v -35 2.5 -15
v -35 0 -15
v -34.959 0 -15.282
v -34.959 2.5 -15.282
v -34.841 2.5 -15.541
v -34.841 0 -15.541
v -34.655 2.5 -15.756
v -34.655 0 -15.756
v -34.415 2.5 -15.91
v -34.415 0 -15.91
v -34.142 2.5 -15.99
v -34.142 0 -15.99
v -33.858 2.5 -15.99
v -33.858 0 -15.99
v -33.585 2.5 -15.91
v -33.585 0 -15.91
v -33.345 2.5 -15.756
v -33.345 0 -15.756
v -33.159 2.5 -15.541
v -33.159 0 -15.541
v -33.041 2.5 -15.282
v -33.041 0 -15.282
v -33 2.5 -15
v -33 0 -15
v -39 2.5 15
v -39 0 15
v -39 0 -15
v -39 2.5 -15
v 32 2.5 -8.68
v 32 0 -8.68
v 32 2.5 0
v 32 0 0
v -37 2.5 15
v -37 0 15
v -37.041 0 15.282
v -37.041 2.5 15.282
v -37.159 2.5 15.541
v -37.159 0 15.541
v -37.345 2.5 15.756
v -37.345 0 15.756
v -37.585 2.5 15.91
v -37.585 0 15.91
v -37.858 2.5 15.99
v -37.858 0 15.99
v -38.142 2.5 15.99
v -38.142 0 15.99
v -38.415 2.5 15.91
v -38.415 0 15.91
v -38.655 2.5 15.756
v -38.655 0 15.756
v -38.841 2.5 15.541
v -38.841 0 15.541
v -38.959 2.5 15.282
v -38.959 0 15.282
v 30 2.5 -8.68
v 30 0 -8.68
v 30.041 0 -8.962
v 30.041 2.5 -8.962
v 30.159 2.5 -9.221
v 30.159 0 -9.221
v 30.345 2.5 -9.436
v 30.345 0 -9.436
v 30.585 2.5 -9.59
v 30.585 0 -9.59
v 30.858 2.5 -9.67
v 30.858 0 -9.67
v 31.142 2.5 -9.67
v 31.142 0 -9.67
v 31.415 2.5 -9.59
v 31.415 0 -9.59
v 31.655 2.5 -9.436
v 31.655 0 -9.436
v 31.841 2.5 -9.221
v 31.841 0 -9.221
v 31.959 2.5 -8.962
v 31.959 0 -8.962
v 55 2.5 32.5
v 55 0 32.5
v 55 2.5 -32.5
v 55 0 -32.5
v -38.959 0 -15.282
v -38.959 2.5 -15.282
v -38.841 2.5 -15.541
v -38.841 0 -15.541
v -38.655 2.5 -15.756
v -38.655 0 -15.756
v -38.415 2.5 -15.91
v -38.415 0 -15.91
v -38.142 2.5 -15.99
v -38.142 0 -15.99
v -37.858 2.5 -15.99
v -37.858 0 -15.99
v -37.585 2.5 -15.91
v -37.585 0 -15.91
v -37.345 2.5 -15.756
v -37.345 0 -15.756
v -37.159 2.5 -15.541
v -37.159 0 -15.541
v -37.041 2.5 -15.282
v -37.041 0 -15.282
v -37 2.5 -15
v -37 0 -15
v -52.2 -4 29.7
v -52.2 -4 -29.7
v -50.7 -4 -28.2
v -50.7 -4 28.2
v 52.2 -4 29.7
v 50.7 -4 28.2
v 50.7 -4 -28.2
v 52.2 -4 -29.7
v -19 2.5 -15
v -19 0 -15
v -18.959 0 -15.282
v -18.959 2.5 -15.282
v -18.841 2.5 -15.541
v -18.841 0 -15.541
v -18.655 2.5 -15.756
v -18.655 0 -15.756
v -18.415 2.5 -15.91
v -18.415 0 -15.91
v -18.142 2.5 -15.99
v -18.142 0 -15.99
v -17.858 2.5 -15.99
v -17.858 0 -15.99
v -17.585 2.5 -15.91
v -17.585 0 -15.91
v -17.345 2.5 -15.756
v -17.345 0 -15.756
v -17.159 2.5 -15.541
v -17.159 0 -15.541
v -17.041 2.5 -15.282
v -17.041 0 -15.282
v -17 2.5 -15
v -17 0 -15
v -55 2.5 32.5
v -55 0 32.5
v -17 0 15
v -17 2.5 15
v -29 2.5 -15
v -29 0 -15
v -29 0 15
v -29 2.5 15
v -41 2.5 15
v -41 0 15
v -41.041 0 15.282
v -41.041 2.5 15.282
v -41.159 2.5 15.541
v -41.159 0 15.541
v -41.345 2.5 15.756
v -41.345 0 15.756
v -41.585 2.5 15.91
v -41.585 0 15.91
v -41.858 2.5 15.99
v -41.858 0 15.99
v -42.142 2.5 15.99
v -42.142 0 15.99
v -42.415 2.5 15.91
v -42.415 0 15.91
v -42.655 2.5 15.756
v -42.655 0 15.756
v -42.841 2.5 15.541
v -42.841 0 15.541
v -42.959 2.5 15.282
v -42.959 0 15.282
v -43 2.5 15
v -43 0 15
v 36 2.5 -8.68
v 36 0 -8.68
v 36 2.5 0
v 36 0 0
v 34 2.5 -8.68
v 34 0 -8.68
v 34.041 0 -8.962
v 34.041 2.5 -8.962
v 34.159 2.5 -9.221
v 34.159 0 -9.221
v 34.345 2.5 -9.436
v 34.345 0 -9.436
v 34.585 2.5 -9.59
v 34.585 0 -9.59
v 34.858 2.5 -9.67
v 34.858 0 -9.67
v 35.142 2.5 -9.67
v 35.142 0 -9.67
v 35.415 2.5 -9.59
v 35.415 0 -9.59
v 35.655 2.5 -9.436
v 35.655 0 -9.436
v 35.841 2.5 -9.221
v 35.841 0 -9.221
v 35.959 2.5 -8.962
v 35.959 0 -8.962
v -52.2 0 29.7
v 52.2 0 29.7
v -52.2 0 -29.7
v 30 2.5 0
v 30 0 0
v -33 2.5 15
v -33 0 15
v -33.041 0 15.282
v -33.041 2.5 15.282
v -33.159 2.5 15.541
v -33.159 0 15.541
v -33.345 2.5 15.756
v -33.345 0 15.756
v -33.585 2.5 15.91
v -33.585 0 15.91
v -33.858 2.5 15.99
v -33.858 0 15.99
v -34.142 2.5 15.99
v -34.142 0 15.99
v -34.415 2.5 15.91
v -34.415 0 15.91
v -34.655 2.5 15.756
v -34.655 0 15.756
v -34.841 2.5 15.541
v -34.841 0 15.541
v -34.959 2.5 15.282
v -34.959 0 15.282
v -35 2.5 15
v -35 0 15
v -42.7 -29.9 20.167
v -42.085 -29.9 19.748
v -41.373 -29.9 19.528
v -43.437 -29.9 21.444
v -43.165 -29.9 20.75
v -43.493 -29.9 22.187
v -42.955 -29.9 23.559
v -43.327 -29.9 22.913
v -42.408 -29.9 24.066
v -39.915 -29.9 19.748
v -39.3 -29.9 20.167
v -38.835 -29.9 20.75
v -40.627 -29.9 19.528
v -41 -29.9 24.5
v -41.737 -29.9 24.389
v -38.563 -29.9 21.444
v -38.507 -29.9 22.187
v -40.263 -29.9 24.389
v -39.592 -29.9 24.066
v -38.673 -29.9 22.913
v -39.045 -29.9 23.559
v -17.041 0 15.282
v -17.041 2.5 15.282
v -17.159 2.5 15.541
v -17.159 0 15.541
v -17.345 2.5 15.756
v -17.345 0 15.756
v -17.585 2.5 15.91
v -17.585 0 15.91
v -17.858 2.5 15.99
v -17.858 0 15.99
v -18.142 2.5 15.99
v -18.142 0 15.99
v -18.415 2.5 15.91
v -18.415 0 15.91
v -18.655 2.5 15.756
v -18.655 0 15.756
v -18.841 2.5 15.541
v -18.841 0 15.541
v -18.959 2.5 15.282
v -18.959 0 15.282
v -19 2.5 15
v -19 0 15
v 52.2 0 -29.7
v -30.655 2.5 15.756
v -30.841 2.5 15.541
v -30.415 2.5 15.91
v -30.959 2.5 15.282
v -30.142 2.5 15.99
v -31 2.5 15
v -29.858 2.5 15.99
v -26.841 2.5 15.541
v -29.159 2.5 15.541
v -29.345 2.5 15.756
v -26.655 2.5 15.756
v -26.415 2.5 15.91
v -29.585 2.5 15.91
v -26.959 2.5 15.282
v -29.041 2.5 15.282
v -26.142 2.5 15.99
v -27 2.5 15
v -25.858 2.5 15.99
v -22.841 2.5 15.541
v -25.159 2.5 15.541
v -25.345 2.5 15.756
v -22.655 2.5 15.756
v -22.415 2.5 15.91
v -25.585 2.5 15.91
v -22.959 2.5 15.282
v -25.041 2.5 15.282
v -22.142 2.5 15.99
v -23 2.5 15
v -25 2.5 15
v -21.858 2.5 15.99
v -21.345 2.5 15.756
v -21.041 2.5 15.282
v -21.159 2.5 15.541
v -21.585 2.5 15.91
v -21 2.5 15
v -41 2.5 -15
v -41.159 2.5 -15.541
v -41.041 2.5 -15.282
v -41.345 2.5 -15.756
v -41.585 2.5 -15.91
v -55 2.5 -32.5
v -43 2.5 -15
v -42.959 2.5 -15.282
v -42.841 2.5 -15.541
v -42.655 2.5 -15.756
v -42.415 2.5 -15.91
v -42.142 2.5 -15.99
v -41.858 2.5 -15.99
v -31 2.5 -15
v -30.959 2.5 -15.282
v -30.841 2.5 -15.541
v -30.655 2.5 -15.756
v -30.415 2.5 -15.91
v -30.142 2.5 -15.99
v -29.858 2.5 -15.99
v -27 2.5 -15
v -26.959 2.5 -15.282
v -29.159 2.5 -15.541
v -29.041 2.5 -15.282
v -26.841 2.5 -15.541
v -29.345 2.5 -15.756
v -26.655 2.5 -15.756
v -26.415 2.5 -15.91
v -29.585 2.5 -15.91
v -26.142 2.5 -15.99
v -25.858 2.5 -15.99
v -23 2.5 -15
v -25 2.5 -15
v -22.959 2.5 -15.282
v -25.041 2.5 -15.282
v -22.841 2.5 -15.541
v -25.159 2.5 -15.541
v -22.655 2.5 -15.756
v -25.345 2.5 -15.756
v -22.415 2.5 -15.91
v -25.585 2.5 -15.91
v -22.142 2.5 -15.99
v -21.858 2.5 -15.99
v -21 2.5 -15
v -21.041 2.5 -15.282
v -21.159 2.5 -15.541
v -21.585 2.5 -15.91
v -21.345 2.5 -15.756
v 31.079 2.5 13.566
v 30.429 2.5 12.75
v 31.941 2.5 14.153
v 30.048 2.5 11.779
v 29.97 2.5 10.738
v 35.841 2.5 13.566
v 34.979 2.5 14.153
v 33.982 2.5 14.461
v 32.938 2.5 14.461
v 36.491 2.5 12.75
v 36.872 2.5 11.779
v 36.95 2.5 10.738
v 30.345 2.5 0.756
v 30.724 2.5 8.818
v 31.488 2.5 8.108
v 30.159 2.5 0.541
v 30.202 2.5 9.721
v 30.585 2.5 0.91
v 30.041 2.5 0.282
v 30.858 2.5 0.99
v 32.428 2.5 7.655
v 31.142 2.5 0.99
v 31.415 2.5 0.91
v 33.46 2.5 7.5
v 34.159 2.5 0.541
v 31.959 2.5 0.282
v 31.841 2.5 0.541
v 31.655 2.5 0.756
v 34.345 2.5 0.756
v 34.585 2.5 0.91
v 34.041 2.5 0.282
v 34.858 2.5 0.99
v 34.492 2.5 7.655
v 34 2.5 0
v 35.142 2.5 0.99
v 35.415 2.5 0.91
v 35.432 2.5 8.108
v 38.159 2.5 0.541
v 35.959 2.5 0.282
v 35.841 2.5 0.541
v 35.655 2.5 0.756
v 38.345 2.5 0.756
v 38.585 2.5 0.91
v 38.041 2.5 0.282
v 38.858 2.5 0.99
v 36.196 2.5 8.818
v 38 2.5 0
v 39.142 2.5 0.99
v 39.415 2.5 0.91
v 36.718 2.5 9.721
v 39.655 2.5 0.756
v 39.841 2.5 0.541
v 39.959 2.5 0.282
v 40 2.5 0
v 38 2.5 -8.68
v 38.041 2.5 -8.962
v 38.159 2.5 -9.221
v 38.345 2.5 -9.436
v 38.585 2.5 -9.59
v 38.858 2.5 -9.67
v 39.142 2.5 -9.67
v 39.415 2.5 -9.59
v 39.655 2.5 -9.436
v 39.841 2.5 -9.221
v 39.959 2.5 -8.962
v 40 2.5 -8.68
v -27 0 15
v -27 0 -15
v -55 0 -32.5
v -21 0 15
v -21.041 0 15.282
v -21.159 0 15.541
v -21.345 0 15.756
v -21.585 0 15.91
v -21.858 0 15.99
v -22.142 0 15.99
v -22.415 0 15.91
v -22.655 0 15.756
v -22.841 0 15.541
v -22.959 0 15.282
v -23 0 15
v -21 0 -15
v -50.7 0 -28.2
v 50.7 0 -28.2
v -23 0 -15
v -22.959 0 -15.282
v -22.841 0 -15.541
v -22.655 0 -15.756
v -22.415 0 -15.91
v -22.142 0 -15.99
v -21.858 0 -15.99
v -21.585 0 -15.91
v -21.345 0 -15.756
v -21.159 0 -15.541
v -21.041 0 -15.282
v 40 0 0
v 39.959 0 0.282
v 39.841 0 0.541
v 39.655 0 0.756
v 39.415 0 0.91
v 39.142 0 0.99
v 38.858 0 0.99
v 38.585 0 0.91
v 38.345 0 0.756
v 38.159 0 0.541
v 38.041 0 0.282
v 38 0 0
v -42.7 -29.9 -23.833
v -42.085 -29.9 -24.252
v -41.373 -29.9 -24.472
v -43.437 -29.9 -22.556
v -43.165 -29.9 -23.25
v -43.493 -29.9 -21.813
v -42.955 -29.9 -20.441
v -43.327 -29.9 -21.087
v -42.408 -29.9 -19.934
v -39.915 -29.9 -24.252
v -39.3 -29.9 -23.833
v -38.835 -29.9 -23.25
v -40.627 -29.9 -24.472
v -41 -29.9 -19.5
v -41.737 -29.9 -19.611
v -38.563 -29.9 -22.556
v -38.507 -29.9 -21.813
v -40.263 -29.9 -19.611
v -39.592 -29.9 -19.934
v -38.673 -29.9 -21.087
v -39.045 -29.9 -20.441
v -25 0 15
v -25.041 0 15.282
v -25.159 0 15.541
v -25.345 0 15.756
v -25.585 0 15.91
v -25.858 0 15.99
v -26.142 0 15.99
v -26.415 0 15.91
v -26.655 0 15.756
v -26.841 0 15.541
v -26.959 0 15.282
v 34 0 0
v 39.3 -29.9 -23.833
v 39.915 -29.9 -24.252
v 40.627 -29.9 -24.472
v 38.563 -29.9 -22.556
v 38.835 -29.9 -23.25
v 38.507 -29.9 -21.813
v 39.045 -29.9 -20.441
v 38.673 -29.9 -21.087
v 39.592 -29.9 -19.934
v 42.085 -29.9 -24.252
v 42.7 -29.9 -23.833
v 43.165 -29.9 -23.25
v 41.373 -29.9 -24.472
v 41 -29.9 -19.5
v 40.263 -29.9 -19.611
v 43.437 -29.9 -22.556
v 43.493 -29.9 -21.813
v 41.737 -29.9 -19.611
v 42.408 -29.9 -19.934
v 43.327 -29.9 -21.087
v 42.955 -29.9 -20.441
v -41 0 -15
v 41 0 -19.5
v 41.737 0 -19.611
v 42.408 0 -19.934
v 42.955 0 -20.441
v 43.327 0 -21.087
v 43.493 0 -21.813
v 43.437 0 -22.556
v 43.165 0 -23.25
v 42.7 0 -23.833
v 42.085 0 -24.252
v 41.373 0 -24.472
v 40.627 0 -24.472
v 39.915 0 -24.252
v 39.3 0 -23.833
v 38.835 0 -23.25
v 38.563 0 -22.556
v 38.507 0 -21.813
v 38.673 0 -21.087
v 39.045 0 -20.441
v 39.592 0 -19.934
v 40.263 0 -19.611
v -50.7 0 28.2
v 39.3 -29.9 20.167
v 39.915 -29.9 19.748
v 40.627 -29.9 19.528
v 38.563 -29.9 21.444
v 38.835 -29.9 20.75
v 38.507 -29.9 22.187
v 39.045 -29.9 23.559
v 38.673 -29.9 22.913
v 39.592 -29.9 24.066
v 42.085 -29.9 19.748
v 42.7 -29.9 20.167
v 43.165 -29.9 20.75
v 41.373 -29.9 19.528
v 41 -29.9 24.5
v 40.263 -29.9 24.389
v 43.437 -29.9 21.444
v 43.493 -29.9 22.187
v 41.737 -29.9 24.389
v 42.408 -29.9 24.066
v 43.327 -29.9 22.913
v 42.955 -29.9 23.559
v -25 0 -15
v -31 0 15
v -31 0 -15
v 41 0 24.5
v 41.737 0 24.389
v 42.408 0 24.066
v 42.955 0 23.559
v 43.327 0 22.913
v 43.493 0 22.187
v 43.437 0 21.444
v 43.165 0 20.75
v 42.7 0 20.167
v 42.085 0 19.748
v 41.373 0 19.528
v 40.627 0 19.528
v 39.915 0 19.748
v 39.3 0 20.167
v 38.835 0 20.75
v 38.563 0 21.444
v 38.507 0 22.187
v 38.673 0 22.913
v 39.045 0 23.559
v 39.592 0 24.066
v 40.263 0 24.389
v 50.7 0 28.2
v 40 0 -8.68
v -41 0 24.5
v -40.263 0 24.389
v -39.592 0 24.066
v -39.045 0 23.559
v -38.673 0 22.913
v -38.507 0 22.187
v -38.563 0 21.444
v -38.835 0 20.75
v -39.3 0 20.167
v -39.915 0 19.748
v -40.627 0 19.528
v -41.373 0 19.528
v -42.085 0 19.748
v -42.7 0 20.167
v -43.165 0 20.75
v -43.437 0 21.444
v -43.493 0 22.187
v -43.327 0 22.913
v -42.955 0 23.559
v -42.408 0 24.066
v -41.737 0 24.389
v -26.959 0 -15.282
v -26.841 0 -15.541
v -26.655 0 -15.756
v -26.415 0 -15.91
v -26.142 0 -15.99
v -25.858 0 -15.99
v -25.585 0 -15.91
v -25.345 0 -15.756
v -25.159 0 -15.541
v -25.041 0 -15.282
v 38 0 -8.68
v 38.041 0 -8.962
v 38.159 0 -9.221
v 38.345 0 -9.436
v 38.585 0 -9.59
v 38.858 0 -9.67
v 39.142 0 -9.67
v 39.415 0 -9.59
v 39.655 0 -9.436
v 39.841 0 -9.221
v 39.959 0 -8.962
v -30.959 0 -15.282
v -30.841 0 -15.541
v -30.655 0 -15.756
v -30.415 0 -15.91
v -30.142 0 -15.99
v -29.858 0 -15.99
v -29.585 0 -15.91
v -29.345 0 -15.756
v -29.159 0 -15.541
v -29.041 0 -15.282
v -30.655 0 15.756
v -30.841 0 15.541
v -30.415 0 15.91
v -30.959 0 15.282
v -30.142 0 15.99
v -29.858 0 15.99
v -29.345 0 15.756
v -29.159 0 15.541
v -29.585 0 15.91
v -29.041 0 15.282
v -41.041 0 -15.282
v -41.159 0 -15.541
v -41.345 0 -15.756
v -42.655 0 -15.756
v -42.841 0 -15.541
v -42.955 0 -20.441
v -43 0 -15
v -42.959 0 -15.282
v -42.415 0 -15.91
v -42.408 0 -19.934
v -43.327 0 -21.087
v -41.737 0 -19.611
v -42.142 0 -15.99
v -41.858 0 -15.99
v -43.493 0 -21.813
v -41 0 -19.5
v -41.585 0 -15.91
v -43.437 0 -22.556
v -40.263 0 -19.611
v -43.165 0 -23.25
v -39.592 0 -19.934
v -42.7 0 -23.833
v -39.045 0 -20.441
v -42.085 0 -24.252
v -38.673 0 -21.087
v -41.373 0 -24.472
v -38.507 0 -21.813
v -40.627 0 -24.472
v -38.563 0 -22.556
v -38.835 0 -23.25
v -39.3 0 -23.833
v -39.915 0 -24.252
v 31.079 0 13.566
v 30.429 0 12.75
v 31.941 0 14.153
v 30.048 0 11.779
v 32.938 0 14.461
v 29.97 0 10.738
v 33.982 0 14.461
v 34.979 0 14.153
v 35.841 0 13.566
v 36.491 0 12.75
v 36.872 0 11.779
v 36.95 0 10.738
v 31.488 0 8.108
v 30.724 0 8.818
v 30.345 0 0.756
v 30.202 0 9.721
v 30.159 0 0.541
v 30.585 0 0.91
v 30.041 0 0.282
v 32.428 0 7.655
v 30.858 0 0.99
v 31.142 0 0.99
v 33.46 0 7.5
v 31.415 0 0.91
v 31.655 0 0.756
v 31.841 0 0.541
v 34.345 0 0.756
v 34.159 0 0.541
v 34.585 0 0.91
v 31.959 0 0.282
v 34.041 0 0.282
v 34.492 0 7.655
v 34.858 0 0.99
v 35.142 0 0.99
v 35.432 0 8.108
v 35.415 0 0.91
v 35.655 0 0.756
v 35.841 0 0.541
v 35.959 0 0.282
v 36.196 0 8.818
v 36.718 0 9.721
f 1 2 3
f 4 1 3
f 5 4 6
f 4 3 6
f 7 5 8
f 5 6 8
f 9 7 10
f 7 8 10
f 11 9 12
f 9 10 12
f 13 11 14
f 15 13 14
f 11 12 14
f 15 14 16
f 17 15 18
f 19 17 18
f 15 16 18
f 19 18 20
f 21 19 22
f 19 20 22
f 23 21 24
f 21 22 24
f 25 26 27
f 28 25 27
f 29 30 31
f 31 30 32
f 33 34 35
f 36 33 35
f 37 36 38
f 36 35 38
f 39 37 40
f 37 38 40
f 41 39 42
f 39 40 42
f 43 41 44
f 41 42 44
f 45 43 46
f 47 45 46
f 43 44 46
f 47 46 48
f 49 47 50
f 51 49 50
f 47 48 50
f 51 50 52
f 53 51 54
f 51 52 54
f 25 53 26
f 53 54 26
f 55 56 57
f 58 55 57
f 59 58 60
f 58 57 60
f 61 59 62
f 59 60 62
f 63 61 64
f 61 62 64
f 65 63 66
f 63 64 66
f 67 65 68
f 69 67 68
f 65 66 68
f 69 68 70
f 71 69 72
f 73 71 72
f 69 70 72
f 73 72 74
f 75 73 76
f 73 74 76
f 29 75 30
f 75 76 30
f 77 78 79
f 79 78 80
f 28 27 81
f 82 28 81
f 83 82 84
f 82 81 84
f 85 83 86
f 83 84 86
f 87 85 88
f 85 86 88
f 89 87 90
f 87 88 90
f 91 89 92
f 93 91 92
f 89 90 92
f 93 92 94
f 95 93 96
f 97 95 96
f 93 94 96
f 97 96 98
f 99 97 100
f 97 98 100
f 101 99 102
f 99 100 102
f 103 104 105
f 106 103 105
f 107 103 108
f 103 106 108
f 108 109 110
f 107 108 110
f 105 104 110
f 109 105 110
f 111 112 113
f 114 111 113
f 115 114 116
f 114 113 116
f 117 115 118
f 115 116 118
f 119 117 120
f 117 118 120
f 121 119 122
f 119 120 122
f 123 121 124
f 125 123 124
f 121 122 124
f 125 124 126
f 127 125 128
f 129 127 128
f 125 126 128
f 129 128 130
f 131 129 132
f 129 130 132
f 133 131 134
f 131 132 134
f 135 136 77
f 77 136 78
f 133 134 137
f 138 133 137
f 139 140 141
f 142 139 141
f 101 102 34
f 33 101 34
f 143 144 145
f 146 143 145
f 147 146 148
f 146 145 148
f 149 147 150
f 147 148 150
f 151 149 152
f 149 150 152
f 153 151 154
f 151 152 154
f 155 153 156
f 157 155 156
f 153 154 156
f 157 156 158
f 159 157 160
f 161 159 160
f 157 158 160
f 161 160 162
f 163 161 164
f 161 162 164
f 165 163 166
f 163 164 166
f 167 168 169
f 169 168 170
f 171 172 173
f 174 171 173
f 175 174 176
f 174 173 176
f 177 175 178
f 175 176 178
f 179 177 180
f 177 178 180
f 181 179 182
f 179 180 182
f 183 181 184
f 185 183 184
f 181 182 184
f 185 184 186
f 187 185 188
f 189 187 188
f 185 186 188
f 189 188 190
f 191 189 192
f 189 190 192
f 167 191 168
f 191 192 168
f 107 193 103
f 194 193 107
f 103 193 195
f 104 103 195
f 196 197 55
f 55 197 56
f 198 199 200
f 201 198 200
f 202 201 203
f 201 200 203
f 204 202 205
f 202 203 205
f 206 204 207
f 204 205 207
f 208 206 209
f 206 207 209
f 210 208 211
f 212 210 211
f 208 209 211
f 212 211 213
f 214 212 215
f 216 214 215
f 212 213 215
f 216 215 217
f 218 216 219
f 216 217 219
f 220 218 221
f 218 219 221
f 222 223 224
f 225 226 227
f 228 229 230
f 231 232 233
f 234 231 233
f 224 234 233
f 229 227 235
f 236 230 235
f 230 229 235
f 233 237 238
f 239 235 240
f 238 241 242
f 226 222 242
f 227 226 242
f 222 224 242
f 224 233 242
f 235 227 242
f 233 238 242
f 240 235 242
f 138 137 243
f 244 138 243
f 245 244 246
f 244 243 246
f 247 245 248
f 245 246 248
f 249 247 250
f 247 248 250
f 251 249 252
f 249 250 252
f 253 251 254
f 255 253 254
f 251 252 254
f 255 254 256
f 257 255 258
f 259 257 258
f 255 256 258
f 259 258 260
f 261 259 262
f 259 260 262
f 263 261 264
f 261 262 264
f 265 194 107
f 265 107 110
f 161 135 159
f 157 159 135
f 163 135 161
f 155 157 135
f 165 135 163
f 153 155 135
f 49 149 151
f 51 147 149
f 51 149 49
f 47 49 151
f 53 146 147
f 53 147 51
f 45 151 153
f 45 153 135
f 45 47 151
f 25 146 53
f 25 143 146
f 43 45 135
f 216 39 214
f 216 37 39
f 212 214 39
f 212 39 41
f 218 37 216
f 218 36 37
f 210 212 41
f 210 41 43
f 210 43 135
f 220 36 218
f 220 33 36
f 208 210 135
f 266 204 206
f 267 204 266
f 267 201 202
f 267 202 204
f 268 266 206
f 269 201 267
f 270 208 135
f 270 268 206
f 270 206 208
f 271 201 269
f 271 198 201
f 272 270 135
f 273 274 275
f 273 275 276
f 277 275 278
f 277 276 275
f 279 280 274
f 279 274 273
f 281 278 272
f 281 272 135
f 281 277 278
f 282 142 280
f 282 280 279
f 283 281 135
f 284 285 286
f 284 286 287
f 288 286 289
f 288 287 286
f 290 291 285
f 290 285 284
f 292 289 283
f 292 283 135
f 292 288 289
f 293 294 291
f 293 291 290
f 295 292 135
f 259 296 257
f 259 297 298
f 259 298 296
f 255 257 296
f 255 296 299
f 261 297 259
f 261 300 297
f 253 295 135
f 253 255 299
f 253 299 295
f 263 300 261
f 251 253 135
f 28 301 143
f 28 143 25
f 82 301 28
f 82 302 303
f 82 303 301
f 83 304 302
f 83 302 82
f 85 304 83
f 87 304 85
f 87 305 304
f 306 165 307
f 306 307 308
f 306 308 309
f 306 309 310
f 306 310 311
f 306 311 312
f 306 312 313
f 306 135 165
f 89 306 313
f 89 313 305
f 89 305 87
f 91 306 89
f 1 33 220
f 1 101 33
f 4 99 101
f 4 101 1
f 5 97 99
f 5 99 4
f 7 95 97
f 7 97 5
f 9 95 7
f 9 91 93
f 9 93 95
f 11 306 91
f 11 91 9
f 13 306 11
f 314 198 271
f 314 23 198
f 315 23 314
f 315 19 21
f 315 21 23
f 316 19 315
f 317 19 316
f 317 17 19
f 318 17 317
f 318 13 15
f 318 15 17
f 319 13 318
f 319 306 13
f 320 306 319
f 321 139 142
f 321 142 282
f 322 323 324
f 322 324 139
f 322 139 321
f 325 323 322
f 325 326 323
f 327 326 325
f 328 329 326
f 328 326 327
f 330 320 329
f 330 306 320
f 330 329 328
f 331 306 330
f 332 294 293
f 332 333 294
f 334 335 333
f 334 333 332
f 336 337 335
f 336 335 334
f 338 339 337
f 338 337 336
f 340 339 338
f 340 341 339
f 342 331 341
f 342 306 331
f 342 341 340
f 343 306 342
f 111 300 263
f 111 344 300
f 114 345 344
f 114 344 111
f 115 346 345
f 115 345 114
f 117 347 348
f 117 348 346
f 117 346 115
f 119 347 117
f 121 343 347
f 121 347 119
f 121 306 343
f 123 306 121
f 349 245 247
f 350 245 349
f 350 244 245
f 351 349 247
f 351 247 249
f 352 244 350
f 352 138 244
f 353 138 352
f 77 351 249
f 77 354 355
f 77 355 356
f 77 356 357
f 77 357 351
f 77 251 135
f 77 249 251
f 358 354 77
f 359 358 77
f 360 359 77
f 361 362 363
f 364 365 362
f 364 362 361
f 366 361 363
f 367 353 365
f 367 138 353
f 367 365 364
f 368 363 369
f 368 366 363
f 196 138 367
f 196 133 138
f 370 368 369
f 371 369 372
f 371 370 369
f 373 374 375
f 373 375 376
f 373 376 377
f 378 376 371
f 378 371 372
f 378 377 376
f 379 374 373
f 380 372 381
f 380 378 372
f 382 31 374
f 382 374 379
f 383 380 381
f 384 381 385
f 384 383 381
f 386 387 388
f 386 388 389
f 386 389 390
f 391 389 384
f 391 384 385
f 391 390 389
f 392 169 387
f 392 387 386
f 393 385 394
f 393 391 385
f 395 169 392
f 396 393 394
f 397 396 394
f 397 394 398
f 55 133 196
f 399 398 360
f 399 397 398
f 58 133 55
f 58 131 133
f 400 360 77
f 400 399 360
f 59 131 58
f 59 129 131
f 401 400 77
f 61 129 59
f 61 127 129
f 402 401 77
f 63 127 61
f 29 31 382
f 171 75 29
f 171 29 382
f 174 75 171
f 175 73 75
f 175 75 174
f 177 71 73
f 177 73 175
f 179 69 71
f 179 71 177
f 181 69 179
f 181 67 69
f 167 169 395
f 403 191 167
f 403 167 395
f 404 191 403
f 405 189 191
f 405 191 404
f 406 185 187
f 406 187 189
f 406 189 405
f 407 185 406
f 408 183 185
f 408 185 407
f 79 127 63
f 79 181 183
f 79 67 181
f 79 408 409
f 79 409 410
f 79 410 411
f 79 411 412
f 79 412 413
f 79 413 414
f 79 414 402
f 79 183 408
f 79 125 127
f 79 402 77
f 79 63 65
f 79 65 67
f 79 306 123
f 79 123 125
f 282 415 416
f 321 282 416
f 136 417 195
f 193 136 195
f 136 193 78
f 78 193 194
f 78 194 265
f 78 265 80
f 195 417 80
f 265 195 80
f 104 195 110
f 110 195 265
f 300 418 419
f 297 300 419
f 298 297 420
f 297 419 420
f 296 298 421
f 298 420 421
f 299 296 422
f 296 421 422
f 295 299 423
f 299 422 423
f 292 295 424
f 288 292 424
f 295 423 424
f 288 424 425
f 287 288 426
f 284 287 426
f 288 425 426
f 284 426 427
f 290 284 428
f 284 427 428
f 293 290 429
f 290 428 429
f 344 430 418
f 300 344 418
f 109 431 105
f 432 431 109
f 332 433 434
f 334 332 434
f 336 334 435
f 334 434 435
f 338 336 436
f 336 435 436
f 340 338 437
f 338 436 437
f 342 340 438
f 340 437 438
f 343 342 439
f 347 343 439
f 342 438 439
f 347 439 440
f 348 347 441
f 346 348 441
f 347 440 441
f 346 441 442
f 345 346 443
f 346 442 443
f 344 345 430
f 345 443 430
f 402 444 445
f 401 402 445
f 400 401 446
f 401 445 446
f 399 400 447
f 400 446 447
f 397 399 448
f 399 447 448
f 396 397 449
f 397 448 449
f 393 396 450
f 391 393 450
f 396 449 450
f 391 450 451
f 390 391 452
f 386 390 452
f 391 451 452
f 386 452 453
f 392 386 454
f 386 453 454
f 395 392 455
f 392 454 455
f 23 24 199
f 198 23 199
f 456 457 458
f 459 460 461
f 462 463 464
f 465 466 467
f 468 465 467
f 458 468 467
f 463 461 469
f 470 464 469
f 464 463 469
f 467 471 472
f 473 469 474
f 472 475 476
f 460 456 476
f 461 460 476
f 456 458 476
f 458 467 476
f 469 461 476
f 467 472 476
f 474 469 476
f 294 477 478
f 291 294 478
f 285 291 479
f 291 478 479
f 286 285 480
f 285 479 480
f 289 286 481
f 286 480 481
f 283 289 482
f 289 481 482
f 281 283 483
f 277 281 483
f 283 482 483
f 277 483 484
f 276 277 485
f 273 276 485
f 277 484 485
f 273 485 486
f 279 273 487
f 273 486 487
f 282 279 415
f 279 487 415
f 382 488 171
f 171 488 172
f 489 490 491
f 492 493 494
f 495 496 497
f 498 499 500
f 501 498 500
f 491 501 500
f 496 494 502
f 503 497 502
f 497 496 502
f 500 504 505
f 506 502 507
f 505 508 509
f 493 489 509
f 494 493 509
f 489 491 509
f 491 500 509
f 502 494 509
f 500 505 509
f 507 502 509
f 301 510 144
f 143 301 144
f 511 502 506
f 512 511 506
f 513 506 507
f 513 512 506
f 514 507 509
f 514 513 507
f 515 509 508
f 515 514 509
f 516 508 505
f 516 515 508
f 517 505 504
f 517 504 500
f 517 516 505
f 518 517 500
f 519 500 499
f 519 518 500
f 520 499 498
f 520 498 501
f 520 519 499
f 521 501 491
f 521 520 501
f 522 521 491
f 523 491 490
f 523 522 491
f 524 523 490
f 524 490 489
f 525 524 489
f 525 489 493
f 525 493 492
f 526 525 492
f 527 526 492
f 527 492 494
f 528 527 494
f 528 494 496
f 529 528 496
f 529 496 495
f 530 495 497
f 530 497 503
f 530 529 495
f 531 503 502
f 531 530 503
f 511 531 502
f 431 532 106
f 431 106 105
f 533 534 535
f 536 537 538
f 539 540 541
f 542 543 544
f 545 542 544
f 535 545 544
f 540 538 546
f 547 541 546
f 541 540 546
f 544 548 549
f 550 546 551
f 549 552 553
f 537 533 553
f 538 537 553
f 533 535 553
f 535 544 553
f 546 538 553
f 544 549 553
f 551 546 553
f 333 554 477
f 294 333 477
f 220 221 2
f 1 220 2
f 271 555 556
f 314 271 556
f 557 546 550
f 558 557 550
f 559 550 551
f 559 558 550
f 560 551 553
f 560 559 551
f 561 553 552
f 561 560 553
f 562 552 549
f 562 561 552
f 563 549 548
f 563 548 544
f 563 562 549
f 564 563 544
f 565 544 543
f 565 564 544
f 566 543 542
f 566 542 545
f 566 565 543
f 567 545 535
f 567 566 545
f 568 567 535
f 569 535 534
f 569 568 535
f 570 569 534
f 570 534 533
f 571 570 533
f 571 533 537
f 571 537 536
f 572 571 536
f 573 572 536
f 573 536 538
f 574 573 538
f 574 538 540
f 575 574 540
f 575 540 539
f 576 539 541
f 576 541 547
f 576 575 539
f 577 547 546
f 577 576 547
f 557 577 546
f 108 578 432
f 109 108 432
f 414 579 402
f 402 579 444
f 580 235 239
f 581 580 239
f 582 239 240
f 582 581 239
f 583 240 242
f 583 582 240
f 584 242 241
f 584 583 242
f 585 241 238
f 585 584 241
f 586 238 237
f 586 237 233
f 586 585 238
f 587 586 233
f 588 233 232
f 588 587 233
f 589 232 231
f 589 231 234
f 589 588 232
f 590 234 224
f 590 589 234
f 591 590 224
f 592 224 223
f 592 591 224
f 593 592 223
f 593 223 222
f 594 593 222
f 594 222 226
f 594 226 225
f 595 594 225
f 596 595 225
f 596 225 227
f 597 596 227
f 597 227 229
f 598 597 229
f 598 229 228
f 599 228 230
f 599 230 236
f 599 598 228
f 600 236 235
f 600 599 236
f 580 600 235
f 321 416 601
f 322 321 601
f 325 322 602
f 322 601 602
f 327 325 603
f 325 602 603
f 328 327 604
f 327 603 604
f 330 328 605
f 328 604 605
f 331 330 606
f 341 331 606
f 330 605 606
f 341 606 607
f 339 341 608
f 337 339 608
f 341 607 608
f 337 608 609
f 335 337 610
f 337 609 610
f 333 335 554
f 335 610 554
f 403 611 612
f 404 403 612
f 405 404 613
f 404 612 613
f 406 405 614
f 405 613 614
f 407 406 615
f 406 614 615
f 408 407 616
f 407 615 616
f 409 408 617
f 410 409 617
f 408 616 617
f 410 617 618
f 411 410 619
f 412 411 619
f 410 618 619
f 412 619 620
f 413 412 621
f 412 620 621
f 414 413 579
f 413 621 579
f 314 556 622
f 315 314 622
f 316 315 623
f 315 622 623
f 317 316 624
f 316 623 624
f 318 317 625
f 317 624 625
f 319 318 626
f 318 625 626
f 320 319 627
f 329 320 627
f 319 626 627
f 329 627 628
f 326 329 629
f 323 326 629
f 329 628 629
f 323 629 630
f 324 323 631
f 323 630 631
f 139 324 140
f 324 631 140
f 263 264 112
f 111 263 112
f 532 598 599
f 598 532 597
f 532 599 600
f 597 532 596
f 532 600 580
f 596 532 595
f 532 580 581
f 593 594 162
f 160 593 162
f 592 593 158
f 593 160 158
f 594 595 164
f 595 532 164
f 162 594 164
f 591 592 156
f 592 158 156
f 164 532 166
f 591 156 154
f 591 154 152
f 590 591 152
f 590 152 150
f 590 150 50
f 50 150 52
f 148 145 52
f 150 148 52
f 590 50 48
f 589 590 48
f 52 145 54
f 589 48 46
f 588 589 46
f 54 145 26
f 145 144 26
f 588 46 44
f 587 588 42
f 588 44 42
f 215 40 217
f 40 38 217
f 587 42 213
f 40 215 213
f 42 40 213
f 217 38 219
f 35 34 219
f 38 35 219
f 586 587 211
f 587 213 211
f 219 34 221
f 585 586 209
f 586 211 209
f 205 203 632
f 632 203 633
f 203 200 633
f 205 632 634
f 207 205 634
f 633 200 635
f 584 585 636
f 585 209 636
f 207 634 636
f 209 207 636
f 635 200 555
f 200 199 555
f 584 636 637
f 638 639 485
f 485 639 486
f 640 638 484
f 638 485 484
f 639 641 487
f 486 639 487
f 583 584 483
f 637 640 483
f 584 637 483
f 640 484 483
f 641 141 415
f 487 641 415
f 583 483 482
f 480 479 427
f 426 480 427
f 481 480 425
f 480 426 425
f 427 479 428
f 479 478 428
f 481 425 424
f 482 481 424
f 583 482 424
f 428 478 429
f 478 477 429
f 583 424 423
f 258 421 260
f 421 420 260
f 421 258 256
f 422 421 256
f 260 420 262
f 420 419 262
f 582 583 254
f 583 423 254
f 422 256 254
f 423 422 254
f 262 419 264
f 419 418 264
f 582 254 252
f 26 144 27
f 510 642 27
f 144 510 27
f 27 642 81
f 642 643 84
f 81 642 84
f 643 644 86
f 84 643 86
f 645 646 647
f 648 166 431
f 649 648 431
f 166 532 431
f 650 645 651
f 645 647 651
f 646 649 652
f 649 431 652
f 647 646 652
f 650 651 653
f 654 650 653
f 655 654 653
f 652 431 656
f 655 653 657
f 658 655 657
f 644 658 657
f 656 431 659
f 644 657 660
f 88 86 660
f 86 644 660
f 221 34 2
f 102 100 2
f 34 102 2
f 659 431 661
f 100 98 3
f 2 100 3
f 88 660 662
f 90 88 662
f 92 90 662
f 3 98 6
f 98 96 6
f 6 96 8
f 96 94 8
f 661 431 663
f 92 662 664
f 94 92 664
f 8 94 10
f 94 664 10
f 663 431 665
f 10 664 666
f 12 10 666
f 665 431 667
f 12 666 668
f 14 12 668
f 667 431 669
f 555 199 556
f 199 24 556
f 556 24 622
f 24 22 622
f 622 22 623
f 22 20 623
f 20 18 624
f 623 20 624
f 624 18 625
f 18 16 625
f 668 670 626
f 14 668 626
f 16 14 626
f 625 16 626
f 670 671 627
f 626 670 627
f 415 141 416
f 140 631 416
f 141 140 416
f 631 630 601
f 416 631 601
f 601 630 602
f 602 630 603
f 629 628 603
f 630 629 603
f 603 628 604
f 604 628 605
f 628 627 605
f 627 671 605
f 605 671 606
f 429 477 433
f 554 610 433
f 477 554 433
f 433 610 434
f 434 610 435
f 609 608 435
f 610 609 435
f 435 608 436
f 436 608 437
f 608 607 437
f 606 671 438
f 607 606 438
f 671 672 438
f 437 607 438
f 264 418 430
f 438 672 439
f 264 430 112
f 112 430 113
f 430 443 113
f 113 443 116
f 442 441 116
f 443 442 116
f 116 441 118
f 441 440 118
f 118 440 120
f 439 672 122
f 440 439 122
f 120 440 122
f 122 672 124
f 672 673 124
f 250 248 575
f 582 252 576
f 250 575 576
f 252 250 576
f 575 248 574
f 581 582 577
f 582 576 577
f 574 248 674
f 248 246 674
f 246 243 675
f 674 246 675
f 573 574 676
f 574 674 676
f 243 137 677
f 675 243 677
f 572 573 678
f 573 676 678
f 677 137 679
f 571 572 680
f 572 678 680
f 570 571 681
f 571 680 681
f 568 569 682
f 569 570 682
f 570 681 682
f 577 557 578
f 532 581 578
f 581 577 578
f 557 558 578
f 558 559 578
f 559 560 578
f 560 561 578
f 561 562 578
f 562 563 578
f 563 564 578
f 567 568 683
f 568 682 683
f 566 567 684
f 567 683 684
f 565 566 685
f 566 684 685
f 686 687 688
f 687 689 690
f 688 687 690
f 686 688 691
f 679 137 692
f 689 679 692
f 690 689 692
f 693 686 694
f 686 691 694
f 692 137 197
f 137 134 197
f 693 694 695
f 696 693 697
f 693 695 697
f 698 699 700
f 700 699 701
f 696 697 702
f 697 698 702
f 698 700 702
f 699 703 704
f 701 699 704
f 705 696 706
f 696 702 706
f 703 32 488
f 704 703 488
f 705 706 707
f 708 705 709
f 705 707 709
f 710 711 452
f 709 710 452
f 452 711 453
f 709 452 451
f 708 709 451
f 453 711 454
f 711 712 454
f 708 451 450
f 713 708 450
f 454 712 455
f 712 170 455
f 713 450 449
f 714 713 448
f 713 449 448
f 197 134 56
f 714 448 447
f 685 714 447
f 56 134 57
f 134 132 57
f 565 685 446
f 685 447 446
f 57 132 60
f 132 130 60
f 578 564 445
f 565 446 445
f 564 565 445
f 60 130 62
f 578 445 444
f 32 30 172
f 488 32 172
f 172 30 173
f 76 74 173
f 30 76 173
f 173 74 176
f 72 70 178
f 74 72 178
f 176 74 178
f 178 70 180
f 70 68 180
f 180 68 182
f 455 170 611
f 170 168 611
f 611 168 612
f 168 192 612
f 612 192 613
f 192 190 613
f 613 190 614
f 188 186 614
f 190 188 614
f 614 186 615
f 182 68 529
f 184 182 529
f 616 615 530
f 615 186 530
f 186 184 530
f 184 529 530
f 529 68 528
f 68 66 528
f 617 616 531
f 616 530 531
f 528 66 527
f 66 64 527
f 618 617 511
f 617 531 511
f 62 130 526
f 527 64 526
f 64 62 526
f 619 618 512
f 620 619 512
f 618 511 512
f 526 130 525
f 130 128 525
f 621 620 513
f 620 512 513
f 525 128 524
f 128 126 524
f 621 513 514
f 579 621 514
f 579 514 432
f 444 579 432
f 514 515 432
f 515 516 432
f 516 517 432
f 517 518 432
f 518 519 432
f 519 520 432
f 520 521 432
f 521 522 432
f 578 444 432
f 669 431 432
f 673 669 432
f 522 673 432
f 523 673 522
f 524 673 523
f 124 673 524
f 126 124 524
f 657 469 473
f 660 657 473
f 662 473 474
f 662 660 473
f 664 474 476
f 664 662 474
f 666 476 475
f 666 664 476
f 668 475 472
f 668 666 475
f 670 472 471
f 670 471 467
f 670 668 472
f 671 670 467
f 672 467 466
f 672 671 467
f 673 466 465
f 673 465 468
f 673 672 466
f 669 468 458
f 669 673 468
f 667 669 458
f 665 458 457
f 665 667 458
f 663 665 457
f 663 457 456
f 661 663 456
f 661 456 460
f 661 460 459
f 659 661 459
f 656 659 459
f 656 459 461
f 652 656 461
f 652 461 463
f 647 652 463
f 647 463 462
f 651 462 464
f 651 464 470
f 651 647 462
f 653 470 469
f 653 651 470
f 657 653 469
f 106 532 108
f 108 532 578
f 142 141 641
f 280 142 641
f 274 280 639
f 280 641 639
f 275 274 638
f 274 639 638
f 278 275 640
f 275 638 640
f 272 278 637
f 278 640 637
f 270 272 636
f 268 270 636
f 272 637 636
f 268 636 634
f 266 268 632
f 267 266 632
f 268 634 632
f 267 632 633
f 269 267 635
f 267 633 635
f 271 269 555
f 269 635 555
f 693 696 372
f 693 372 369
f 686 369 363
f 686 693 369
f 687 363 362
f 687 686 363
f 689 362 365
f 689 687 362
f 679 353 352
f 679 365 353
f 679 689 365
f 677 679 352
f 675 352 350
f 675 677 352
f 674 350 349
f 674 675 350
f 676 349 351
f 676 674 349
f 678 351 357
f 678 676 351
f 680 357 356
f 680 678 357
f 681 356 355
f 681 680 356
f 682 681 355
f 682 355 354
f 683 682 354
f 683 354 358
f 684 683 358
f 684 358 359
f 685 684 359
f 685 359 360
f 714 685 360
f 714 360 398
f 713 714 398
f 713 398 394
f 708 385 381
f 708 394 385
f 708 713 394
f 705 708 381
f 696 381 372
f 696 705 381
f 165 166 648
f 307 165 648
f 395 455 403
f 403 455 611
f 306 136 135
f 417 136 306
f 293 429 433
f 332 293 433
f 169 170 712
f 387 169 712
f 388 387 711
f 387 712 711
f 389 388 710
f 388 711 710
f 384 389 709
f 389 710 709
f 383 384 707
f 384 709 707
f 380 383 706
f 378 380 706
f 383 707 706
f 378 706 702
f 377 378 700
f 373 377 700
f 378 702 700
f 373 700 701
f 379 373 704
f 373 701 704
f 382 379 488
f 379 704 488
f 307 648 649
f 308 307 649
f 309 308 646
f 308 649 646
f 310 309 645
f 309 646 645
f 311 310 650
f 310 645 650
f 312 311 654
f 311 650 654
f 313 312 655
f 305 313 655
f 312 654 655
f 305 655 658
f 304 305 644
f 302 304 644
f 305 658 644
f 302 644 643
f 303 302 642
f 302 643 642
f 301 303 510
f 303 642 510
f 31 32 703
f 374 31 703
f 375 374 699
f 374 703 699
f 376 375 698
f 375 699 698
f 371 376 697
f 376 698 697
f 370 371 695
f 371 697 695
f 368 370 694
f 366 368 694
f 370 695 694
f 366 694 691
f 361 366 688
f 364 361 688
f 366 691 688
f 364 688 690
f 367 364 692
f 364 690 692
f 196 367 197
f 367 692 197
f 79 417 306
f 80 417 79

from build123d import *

# Parameters (mm, degrees)
CROQUIS_TAPA_W                    = 110
CROQUIS_TAPA_H                    = 65
TAPA_DEPTH                        = 2.5
CROQUIS_PESTANA_W                 = 104.4
CROQUIS_PESTANA_H                 = 59.4
PESTANA_DEPTH                     = 4
CROQUIS_PESTANA_HUECO_W           = 101.4
CROQUIS_PESTANA_HUECO_H           = 56.4
PESTANA_HUECO_DEPTH               = 4
CROQUIS_POSTES_R                  = 2.5
POSTES_PCB_DEPTH                  = 29.9
VENTANA_LDR_Y_VENTILAS_DEPTH      = 71.535522965
VENTANA_LDR_Y_VENTILAS_DEPTH_BACK = 71.535522965
CROQUIS_VENTANA_Y_VENTILAS_R      = 3.5


with BuildPart() as part:
    # Croquis_tapa → Tapa (new body)
    with BuildSketch(Plane(origin=(0, 0, 0), x_dir=(1, 0, 0), z_dir=(0, 1, 0))):
        Rectangle(CROQUIS_TAPA_W, CROQUIS_TAPA_H)
    extrude(amount=TAPA_DEPTH)

    # Croquis_pestana → Pestana (add)
    with BuildSketch(Plane(origin=(0, 0, 0), x_dir=(1, 0, 0), z_dir=(0, 1, 0))):
        Rectangle(CROQUIS_PESTANA_W, CROQUIS_PESTANA_H)
    extrude(amount=-PESTANA_DEPTH)

    # Croquis_pestana_hueco → Pestana_hueco (cut)
    with BuildSketch(Plane(origin=(0, 0, 0), x_dir=(1, 0, 0), z_dir=(0, 1, 0))):
        Rectangle(CROQUIS_PESTANA_HUECO_W, CROQUIS_PESTANA_HUECO_H)
    extrude(amount=-PESTANA_HUECO_DEPTH, mode=Mode.SUBTRACT)

    # Croquis_postes → Postes_PCB (add)
    with BuildSketch(Plane(origin=(0, 0, 0), x_dir=(1, 0, 0), z_dir=(0, 1, 0))):
        with Locations(Location((-41, 22, 0), (0, 0, 270))):
            Circle(CROQUIS_POSTES_R)
        with Locations(Location((-41, -22, 0), (0, 0, 270))):
            Circle(CROQUIS_POSTES_R)
        with Locations(Location((41, 22, 0), (0, 0, 270))):
            Circle(CROQUIS_POSTES_R)
        with Locations(Location((41, -22, 0), (0, 0, 270))):
            Circle(CROQUIS_POSTES_R)
    extrude(amount=-POSTES_PCB_DEPTH)

    # Croquis_ventana_y_ventilas → Ventana_LDR_y_ventilas (cut, two sides: drawn at the far end of the back side and taken through both)
    with BuildSketch(Plane(origin=(0, 0, 0), x_dir=(1, 0, 0), z_dir=(0, 1, 0)).offset(-VENTANA_LDR_Y_VENTILAS_DEPTH_BACK)):
        with Locations(Location((33.46, -11, 0), (0, 0, 90))):
            Circle(CROQUIS_VENTANA_Y_VENTILAS_R)
        with BuildLine():
            Line((30, 0), (30, 8.68))
            ThreePointArc((30, 8.68), (31, 9.68), (32, 8.68))
            Line((32, 8.68), (32, 0))
            ThreePointArc((32, 0), (31, -1), (30, 0))
        make_face()
        with BuildLine():
            Line((34, 0), (34, 8.68))
            ThreePointArc((34, 8.68), (35, 9.68), (36, 8.68))
            Line((36, 8.68), (36, 0))
            ThreePointArc((36, 0), (35, -1), (34, 0))
        make_face()
        with BuildLine():
            Line((38, 0), (38, 8.68))
            ThreePointArc((38, 8.68), (39, 9.68), (40, 8.68))
            Line((40, 8.68), (40, 0))
            ThreePointArc((40, 0), (39, -1), (38, 0))
        make_face()
        with BuildLine():
            Line((-19, -15), (-19, 15))
            ThreePointArc((-19, 15), (-18, 16), (-17, 15))
            Line((-17, 15), (-17, -15))
            ThreePointArc((-17, -15), (-18, -16), (-19, -15))
        make_face()
        with BuildLine():
            Line((-23, -15), (-23, 15))
            ThreePointArc((-23, 15), (-22, 16), (-21, 15))
            Line((-21, 15), (-21, -15))
            ThreePointArc((-21, -15), (-22, -16), (-23, -15))
        make_face()
        with BuildLine():
            Line((-27, -15), (-27, 15))
            ThreePointArc((-27, 15), (-26, 16), (-25, 15))
            Line((-25, 15), (-25, -15))
            ThreePointArc((-25, -15), (-26, -16), (-27, -15))
        make_face()
        with BuildLine():
            Line((-31, -15), (-31, 15))
            ThreePointArc((-31, 15), (-30, 16), (-29, 15))
            Line((-29, 15), (-29, -15))
            ThreePointArc((-29, -15), (-30, -16), (-31, -15))
        make_face()
        with BuildLine():
            Line((-35, -15), (-35, 15))
            ThreePointArc((-35, 15), (-34, 16), (-33, 15))
            Line((-33, 15), (-33, -15))
            ThreePointArc((-33, -15), (-34, -16), (-35, -15))
        make_face()
        with BuildLine():
            Line((-39, -15), (-39, 15))
            ThreePointArc((-39, 15), (-38, 16), (-37, 15))
            Line((-37, 15), (-37, -15))
            ThreePointArc((-37, -15), (-38, -16), (-39, -15))
        make_face()
        with BuildLine():
            Line((-43, -15), (-43, 15))
            ThreePointArc((-43, 15), (-42, 16), (-41, 15))
            Line((-41, 15), (-41, -15))
            ThreePointArc((-41, -15), (-42, -16), (-43, -15))
        make_face()
    extrude(amount=VENTANA_LDR_Y_VENTILAS_DEPTH + VENTANA_LDR_Y_VENTILAS_DEPTH_BACK, mode=Mode.SUBTRACT)


solid = part.part
